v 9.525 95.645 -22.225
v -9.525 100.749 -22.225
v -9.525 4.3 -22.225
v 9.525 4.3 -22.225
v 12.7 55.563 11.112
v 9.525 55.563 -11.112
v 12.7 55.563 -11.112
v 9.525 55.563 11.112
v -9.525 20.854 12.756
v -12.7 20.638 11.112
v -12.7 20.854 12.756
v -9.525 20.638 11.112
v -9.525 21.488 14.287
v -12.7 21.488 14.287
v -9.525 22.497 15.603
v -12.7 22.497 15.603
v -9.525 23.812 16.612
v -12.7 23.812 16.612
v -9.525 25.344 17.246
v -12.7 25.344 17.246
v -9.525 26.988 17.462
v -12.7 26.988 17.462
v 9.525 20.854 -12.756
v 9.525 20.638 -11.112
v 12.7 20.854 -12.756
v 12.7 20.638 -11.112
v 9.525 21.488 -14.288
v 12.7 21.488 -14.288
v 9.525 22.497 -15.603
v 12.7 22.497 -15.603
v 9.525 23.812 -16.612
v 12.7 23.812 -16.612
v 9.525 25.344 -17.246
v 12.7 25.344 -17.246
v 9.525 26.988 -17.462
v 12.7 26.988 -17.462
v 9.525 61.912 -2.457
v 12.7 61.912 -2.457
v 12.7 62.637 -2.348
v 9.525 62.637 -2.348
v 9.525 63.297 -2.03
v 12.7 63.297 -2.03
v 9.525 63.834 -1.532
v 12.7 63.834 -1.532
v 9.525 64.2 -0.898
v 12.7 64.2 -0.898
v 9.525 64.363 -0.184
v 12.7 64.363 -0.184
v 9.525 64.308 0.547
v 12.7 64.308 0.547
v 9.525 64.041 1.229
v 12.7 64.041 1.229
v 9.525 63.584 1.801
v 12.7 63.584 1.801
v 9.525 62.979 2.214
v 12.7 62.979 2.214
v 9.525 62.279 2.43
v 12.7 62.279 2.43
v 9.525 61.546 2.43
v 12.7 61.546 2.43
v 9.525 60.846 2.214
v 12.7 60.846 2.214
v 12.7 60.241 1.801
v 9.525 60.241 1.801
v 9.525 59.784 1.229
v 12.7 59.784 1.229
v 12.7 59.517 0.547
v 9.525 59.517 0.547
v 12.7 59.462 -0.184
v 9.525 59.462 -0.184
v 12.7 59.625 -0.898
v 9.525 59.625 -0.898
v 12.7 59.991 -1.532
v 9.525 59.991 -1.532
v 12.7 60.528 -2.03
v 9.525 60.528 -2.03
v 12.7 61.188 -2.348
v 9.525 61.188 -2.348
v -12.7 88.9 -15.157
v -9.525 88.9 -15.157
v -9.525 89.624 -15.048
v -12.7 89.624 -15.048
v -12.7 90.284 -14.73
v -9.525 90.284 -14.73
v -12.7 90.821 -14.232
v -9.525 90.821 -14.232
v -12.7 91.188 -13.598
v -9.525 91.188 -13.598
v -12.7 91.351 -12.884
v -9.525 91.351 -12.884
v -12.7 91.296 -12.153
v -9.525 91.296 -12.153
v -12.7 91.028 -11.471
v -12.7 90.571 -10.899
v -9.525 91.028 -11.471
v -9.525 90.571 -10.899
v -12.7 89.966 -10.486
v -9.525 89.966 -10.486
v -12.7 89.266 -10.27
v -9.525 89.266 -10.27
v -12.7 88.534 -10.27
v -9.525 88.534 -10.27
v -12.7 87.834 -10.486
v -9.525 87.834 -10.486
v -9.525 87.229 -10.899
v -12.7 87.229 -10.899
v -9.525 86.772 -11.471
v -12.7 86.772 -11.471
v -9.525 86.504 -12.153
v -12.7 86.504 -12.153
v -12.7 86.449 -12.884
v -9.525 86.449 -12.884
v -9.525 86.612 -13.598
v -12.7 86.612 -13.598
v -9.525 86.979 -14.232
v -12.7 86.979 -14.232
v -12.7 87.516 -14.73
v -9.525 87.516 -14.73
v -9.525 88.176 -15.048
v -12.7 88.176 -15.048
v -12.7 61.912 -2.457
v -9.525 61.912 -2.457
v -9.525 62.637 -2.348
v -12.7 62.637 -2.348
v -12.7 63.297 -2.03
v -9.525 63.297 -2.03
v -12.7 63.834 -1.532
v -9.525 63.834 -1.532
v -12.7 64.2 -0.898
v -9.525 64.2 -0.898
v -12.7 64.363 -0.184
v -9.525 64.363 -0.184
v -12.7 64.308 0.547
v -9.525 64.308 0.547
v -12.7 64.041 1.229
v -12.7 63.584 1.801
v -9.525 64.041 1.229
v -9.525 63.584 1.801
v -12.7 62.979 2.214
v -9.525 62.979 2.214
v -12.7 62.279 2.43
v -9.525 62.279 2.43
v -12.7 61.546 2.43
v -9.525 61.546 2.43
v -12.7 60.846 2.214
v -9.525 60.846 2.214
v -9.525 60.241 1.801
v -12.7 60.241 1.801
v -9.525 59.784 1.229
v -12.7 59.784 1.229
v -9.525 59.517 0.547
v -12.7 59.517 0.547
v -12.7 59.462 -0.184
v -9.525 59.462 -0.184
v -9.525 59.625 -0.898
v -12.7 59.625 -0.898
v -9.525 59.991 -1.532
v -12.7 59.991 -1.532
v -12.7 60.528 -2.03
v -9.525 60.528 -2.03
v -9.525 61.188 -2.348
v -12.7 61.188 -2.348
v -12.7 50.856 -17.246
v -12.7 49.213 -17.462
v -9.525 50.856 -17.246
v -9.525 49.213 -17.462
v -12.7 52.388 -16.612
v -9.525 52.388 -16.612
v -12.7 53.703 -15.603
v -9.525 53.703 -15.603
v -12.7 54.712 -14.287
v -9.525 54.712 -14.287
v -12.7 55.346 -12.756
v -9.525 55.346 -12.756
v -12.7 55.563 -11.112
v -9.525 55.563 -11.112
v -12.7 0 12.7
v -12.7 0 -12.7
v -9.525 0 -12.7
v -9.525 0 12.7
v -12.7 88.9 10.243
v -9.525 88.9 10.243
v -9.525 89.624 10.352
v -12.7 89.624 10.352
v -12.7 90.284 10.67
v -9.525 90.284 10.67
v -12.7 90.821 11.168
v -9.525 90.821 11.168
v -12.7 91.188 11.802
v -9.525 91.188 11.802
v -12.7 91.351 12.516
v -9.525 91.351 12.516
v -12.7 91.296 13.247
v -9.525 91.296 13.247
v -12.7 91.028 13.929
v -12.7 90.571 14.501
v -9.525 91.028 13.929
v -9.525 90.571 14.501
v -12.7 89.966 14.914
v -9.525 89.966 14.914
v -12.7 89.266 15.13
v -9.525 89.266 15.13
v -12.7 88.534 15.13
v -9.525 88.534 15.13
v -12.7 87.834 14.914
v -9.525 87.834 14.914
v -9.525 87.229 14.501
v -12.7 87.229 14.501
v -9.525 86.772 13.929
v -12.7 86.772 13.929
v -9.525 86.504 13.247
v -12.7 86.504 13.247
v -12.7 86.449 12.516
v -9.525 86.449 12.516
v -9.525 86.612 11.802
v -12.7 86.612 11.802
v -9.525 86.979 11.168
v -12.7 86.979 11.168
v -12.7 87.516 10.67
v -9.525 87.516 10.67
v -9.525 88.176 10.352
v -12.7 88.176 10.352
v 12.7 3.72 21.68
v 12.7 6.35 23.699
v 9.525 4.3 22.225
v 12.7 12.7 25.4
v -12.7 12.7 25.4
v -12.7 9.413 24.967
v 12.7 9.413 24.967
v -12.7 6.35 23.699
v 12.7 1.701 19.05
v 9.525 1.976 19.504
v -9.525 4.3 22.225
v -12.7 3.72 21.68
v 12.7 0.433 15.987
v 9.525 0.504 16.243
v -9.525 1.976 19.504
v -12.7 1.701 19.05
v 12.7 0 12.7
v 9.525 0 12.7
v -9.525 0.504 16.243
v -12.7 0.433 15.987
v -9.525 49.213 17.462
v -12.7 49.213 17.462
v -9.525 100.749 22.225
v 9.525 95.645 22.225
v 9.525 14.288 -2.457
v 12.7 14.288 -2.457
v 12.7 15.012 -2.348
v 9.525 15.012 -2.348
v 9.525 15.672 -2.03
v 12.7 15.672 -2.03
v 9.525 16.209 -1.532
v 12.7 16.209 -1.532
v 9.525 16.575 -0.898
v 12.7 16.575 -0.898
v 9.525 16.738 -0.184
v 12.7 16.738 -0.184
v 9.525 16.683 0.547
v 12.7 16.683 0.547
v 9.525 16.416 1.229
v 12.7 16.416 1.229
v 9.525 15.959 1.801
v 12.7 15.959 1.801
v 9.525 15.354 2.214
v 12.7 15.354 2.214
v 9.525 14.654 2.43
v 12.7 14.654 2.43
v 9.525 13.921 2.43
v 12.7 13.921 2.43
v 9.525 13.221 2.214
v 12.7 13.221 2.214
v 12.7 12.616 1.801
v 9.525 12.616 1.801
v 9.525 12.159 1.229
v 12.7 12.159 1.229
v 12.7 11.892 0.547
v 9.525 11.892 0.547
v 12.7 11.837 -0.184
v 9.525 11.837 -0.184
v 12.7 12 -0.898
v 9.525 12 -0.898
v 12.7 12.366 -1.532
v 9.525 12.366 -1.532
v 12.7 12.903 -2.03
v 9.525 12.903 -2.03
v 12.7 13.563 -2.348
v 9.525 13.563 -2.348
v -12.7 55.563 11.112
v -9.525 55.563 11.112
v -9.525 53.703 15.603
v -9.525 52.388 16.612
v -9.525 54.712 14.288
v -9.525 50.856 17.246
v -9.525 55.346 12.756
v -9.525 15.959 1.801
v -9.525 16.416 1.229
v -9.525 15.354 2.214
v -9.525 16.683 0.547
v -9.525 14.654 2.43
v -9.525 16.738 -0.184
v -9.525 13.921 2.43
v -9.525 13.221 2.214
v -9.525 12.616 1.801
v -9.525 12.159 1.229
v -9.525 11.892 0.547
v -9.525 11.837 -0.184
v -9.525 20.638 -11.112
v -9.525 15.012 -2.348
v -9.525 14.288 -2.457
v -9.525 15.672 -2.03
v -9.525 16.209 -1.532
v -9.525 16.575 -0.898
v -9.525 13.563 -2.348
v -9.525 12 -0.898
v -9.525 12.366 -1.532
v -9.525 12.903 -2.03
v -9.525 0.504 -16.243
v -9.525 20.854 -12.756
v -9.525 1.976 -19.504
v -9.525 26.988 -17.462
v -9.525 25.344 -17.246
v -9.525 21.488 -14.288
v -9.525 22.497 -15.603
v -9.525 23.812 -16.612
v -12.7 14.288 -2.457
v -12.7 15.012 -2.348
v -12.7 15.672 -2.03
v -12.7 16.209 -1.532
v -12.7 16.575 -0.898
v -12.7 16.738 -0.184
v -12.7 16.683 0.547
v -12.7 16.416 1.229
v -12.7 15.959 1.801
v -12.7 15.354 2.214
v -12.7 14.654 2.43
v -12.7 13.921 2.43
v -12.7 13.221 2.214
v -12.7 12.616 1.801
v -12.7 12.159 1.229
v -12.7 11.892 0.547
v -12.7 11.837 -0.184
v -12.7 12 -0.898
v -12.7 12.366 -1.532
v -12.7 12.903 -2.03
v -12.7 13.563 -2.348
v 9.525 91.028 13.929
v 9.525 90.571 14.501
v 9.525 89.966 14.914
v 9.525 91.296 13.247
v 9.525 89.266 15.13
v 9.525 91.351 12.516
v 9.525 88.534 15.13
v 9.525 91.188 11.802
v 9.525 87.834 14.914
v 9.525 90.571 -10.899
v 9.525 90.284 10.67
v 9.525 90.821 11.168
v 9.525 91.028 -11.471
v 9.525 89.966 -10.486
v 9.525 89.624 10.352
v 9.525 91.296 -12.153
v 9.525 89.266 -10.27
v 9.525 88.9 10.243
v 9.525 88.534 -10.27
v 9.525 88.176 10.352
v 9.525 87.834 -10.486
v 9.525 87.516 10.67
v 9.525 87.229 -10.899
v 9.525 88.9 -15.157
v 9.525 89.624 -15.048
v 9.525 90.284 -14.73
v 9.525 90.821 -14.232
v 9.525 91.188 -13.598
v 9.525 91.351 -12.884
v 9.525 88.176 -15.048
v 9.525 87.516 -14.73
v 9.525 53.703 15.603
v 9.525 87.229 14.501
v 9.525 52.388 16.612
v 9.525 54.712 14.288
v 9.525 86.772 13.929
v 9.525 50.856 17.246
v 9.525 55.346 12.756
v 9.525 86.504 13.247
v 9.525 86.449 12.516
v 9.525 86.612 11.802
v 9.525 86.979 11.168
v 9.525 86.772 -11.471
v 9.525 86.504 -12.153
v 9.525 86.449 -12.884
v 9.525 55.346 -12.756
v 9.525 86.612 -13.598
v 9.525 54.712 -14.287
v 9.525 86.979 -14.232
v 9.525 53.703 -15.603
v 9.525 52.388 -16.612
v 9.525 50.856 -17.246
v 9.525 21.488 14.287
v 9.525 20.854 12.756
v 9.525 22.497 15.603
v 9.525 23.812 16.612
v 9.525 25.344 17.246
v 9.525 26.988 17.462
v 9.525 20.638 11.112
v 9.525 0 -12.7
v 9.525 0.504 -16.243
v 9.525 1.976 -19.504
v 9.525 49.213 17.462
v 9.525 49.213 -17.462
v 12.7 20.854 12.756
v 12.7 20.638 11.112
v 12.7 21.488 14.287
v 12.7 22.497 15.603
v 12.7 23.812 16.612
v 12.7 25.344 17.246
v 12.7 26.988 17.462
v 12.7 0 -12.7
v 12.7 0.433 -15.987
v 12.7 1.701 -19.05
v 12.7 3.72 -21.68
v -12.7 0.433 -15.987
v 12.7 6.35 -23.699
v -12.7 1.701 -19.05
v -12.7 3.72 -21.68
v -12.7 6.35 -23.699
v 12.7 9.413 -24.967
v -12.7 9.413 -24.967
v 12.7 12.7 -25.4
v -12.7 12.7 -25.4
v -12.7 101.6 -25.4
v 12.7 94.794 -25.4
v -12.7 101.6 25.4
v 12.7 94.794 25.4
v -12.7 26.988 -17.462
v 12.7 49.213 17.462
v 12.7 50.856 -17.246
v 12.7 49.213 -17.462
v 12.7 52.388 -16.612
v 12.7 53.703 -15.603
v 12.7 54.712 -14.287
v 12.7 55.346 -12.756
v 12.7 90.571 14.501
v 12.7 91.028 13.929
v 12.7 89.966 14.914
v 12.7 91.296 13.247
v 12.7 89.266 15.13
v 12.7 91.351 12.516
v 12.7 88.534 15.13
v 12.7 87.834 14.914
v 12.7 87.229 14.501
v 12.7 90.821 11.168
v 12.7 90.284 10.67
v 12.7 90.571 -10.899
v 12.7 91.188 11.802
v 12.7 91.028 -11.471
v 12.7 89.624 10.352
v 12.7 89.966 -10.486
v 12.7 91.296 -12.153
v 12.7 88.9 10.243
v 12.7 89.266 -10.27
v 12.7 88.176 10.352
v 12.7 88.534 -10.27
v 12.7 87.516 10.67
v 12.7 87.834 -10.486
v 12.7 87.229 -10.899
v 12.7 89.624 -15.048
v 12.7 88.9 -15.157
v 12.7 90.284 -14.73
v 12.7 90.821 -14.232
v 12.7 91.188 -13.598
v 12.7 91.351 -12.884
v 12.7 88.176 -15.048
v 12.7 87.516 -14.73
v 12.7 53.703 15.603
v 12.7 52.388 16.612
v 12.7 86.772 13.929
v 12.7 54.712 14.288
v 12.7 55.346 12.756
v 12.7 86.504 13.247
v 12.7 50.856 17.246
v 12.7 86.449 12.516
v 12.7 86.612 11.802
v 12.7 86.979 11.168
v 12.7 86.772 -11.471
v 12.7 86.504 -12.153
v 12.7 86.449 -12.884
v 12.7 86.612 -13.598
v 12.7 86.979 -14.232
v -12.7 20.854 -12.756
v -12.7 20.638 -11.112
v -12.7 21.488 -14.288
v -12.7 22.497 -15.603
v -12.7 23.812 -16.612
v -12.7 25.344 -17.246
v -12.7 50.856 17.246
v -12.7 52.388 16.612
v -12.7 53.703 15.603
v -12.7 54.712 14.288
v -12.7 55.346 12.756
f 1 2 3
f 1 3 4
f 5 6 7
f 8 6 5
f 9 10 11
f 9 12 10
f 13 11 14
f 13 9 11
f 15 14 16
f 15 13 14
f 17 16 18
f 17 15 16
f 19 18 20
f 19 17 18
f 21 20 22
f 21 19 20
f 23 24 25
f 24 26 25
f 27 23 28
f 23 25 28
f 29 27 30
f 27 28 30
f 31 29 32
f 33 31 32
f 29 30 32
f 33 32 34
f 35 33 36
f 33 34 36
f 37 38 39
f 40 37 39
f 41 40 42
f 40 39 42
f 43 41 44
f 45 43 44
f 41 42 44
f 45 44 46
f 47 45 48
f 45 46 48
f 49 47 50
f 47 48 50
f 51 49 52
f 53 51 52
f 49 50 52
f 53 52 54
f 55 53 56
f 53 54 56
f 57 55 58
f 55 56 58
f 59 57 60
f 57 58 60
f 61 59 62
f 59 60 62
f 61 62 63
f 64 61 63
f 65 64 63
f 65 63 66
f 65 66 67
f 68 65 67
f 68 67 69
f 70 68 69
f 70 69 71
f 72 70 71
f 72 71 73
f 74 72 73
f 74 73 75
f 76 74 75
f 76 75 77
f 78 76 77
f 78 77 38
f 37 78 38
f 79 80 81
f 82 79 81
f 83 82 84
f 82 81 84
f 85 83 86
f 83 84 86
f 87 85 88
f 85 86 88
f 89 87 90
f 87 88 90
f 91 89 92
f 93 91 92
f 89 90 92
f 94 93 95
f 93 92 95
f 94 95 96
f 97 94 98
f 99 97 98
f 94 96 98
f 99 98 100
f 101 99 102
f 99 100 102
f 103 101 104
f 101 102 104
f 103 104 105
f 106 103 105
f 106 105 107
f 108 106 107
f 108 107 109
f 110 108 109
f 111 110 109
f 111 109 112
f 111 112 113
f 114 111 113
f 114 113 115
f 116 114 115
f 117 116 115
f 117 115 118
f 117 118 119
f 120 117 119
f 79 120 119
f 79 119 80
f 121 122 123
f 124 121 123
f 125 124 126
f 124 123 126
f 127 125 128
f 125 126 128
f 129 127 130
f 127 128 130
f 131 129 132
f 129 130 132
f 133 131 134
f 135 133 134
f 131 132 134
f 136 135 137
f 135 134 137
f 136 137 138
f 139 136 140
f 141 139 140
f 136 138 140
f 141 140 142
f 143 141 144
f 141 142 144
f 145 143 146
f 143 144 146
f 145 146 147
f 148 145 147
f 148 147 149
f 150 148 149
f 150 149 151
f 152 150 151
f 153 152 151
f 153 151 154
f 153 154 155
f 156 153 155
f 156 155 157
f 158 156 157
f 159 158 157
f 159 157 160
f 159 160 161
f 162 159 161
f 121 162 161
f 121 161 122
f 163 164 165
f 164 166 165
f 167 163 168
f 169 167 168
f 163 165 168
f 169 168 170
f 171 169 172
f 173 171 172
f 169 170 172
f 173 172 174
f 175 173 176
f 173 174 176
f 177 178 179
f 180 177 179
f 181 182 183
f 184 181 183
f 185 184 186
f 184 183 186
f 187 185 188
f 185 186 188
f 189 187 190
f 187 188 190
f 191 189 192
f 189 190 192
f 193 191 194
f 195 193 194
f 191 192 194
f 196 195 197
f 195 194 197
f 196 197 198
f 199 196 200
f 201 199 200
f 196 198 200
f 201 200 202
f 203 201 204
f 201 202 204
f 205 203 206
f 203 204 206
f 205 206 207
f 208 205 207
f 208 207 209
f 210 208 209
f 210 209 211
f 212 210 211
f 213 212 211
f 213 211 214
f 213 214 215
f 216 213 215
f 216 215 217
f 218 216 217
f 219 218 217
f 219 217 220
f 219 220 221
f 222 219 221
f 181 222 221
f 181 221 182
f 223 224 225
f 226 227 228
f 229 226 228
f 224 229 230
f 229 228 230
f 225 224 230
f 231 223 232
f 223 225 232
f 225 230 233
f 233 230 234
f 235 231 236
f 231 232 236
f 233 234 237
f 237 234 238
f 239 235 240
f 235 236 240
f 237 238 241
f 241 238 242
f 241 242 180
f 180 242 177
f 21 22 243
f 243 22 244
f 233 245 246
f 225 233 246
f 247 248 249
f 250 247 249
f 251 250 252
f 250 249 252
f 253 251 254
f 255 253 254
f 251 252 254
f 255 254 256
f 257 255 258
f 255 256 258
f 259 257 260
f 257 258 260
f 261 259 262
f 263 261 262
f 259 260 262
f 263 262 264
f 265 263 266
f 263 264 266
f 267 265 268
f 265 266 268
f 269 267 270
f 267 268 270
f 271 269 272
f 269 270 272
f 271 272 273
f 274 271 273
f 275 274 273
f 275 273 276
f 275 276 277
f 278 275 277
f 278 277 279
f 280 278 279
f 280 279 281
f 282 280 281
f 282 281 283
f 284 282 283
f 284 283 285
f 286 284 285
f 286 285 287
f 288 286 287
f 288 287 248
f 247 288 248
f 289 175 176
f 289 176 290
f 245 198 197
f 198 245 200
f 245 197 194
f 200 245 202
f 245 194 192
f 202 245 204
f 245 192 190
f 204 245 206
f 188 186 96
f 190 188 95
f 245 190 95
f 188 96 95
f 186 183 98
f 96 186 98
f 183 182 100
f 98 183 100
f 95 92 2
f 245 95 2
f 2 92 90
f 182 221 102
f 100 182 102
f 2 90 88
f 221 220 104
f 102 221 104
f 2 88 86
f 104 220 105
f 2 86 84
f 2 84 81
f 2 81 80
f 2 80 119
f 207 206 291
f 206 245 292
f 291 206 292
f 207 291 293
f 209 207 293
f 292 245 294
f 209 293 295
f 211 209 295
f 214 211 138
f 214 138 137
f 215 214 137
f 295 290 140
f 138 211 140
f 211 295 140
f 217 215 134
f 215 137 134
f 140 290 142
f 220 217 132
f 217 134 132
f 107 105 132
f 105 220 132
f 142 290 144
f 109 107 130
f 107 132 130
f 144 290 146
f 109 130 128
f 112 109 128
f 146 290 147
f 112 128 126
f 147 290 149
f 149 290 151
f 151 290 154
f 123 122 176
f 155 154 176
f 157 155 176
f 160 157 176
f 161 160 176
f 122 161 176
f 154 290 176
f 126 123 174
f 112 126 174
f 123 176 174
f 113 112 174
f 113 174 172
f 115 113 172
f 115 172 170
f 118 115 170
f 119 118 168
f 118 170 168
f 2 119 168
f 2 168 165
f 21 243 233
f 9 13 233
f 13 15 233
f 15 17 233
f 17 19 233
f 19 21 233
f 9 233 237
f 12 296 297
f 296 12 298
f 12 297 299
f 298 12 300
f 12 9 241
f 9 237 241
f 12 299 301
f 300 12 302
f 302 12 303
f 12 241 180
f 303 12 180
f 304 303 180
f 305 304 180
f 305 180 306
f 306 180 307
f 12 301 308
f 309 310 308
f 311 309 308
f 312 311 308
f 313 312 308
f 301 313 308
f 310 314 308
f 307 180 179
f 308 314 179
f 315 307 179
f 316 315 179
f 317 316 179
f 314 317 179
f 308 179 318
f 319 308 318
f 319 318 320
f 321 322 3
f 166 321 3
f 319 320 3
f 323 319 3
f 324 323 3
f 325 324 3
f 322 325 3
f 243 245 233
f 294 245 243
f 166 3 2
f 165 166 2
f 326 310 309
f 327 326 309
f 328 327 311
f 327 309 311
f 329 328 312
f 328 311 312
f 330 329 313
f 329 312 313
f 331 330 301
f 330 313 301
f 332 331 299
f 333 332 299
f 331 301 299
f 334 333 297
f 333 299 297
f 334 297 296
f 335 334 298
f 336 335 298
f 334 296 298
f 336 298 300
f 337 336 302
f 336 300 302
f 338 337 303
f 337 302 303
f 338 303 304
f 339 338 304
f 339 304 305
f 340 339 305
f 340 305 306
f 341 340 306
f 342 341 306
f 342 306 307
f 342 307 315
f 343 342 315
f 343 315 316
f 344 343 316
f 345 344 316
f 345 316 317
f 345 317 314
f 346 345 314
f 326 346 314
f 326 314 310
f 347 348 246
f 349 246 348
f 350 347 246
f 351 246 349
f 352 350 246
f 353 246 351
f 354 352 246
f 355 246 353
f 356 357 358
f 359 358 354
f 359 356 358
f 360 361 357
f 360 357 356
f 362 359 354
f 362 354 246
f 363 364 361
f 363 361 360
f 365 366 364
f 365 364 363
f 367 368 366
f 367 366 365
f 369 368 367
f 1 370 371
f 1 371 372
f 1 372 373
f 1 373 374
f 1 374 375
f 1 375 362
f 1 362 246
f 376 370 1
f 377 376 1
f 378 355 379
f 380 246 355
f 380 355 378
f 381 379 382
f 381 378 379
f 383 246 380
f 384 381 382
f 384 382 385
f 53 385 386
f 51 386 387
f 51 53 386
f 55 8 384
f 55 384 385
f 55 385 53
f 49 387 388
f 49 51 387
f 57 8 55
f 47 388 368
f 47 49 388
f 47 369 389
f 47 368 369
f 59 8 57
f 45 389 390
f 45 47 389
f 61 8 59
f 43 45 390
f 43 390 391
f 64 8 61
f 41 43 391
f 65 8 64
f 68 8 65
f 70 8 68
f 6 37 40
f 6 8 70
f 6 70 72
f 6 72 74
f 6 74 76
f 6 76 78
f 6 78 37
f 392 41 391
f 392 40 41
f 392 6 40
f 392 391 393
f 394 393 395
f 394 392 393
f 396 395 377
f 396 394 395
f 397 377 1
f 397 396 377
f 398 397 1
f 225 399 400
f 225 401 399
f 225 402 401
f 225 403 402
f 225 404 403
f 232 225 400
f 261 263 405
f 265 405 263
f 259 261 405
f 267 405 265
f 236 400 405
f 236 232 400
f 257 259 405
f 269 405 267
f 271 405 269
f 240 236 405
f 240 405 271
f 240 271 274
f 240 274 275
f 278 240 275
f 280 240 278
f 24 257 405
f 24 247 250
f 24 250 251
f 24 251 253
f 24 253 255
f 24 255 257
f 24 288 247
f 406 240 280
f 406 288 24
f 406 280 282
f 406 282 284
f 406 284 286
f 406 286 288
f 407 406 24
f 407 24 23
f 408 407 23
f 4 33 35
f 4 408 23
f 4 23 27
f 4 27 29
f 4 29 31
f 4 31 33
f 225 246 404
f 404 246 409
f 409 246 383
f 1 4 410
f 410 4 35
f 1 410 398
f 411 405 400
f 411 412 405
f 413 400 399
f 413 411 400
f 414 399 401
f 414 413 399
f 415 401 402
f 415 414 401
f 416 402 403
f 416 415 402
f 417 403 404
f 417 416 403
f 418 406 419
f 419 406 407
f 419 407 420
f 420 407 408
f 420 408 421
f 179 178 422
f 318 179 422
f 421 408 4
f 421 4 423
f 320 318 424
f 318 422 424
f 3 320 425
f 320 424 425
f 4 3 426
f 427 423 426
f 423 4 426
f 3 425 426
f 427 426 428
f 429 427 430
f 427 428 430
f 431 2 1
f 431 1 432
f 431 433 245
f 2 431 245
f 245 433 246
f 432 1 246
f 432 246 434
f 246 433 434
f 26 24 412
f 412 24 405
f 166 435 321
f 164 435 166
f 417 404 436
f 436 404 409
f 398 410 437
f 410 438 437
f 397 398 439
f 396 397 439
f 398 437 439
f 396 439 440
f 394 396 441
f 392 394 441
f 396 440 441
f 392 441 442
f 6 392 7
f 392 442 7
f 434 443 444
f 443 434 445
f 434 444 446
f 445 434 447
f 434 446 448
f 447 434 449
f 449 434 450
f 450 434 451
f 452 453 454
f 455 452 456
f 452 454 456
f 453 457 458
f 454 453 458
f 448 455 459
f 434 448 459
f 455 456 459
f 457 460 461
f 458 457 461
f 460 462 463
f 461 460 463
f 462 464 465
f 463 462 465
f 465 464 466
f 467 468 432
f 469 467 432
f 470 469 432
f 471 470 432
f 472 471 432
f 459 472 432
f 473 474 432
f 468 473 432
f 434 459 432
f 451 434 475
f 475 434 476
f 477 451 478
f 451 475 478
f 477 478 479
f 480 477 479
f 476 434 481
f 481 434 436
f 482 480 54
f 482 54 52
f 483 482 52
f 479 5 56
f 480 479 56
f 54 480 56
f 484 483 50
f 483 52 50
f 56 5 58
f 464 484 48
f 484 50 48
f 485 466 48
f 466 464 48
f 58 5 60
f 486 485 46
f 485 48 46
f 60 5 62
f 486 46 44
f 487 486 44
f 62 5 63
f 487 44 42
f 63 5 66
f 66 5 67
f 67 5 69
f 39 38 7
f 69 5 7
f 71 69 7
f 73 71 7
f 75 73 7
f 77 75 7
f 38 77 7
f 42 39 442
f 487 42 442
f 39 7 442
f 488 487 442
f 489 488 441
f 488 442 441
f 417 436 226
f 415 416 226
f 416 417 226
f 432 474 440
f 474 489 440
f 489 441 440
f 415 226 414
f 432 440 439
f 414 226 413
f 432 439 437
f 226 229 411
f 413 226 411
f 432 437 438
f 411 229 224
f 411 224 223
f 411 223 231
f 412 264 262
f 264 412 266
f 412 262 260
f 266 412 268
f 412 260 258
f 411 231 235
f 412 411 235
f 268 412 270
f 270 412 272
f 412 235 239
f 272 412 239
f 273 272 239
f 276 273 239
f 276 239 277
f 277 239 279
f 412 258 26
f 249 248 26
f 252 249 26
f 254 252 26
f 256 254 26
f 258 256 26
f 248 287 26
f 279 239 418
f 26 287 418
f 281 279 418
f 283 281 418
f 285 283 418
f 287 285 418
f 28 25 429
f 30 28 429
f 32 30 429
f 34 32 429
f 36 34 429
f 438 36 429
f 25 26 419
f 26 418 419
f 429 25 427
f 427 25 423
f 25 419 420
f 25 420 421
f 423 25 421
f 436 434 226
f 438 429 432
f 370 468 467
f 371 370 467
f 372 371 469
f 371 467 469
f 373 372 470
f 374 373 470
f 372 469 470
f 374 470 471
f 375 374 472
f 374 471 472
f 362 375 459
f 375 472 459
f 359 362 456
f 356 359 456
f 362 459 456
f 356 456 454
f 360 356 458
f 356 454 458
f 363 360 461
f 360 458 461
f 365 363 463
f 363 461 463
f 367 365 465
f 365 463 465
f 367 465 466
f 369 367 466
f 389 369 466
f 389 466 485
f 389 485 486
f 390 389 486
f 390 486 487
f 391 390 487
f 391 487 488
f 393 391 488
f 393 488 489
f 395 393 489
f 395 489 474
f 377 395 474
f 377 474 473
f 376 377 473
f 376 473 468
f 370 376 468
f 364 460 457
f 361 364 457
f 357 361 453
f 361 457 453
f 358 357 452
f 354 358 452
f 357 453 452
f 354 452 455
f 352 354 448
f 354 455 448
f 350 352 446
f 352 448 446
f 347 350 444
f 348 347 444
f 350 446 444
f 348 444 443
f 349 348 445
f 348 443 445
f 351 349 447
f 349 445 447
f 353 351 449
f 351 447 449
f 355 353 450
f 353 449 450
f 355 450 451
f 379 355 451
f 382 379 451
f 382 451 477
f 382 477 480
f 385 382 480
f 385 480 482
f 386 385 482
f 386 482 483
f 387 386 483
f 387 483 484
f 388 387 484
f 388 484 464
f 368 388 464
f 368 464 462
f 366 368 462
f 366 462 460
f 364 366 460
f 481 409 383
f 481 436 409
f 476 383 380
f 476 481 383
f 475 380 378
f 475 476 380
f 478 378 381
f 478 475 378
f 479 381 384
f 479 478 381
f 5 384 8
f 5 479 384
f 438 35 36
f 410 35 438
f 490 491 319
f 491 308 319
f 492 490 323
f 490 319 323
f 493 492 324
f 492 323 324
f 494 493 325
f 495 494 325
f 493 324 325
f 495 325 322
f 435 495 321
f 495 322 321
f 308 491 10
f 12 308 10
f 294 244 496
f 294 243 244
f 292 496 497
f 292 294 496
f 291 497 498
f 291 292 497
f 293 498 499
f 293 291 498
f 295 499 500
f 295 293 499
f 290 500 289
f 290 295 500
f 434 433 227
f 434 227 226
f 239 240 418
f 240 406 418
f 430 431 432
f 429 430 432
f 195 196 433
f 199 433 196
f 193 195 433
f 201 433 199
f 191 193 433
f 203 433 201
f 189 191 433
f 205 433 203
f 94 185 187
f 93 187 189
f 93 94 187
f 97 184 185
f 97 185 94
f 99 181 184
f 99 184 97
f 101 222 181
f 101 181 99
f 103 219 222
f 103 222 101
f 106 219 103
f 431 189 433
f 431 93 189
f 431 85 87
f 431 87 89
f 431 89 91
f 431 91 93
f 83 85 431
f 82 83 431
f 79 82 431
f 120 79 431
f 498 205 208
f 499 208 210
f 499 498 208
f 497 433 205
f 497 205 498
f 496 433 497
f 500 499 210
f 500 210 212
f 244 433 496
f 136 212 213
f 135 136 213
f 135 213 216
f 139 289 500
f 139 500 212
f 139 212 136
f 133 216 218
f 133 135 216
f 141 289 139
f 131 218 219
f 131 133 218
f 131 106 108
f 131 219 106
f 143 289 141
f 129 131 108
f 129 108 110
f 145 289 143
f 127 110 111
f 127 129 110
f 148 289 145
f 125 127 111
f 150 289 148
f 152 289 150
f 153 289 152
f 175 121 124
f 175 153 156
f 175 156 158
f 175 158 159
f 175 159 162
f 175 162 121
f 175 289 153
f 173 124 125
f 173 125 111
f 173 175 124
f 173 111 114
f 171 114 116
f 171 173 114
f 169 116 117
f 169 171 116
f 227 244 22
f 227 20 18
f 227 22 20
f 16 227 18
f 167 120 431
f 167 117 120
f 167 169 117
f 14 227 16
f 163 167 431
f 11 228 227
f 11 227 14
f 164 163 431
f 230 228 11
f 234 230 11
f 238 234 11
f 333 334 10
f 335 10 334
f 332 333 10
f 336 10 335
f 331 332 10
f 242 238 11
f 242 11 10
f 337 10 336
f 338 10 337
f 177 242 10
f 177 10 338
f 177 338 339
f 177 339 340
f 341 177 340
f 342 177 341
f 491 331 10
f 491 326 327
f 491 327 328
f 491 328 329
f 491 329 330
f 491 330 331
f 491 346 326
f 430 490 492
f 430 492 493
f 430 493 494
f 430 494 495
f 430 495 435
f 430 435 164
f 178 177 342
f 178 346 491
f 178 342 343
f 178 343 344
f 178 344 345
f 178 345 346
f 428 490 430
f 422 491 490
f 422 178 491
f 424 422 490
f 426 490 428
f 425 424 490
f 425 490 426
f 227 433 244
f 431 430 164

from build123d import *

# Parameters (mm, degrees)
SKETCH1_W                    = 25.4
SKETCH1_H                    = 50.8
SKETCH1_W_2                  = 19.05
SKETCH1_H_2                  = 44.45
BOSS_EXTRUDE1_DEPTH          = 101.6
CUT_EXTRUDE1_DEPTH           = 115.3
CUT_EXTRUDE2_DEPTH           = 108.763073453
SKETCH4_W                    = 34.925
SKETCH4_H                    = 34.925
CUT_EXTRUDE3_DEPTH           = 108.763073453
F_10_0_1935_DIAMETER_HOLE1_D = 4.9149
FILLET1_R                    = 6.35
F_10_0_1935_DIAMETER_HOLE2_D = 4.9149


with BuildPart() as part:
    # Sketch1 → Boss-Extrude1 (new body)
    with BuildSketch(Plane(origin=(0, 0, 0), x_dir=(1, 0, 0), z_dir=(0, 1, 0))):
        Rectangle(SKETCH1_W, SKETCH1_H)
        Rectangle(SKETCH1_W_2, SKETCH1_H_2, mode=Mode.SUBTRACT)
    extrude(amount=BOSS_EXTRUDE1_DEPTH)

    # Sketch2 → Cut-Extrude1 (cut, through all)
    with BuildSketch(Plane.XY.offset(25.4)):
        Polygon((12.7, 101.6), (-12.7, 101.6), (12.7, 94.794090512), align=None)
    extrude(amount=-CUT_EXTRUDE1_DEPTH, mode=Mode.SUBTRACT)

    # Sketch3 → Cut-Extrude2 (cut, through all)
    with BuildSketch(Plane.ZY.offset(12.7)):
        with BuildLine():
            Line((-25.4, 12.7), (-25.4, 0))
            Line((-25.4, 0), (-12.7, 0))
            ThreePointArc((-12.7, 0), (-21.680256121, 3.719743879), (-25.4, 12.7))
        make_face()
        with BuildLine():
            ThreePointArc((25.4, 12.7), (21.680256121, 3.719743879), (12.7, 0))
            Line((12.7, 0), (25.4, 0))
            Line((25.4, 0), (25.4, 12.7))
        make_face()
    extrude(amount=-CUT_EXTRUDE2_DEPTH, mode=Mode.SUBTRACT)

    # Sketch4 → Cut-Extrude3 (cut, through all)
    with BuildSketch(Plane.ZY.offset(12.7)):
        with Locations((0, 38.1)):
            Rectangle(SKETCH4_W, SKETCH4_H)
    extrude(amount=-CUT_EXTRUDE3_DEPTH, mode=Mode.SUBTRACT)

    # #10 (0.1935) Diameter Hole1 (through all)
    with Locations(Plane.ZY.offset(12.7)):
        with Locations((0, 61.9125), (0, 14.2875)):
            Hole(F_10_0_1935_DIAMETER_HOLE1_D / 2)

    # Fillet1
    fillet1_edges = [part.edges().sort_by_distance(p)[0] for p in [
        (-11.1125, 20.6375, -17.4625),
        (-11.1125, 55.5625, -17.4625),
        (-11.1125, 55.5625, 17.4625),
        (-11.1125, 20.6375, 17.4625),
        (11.1125, 20.6375, -17.4625),
        (11.1125, 55.5625, -17.4625),
        (11.1125, 55.5625, 17.4625),
        (11.1125, 20.6375, 17.4625),
    ]]
    fillet(fillet1_edges, radius=FILLET1_R)

    # #10 (0.1935) Diameter Hole2 (through all)
    with Locations(Plane.ZY.offset(12.7)):
        with Locations((-12.7, 88.9), (12.7, 88.9)):
            Hole(F_10_0_1935_DIAMETER_HOLE2_D / 2)


solid = part.part
